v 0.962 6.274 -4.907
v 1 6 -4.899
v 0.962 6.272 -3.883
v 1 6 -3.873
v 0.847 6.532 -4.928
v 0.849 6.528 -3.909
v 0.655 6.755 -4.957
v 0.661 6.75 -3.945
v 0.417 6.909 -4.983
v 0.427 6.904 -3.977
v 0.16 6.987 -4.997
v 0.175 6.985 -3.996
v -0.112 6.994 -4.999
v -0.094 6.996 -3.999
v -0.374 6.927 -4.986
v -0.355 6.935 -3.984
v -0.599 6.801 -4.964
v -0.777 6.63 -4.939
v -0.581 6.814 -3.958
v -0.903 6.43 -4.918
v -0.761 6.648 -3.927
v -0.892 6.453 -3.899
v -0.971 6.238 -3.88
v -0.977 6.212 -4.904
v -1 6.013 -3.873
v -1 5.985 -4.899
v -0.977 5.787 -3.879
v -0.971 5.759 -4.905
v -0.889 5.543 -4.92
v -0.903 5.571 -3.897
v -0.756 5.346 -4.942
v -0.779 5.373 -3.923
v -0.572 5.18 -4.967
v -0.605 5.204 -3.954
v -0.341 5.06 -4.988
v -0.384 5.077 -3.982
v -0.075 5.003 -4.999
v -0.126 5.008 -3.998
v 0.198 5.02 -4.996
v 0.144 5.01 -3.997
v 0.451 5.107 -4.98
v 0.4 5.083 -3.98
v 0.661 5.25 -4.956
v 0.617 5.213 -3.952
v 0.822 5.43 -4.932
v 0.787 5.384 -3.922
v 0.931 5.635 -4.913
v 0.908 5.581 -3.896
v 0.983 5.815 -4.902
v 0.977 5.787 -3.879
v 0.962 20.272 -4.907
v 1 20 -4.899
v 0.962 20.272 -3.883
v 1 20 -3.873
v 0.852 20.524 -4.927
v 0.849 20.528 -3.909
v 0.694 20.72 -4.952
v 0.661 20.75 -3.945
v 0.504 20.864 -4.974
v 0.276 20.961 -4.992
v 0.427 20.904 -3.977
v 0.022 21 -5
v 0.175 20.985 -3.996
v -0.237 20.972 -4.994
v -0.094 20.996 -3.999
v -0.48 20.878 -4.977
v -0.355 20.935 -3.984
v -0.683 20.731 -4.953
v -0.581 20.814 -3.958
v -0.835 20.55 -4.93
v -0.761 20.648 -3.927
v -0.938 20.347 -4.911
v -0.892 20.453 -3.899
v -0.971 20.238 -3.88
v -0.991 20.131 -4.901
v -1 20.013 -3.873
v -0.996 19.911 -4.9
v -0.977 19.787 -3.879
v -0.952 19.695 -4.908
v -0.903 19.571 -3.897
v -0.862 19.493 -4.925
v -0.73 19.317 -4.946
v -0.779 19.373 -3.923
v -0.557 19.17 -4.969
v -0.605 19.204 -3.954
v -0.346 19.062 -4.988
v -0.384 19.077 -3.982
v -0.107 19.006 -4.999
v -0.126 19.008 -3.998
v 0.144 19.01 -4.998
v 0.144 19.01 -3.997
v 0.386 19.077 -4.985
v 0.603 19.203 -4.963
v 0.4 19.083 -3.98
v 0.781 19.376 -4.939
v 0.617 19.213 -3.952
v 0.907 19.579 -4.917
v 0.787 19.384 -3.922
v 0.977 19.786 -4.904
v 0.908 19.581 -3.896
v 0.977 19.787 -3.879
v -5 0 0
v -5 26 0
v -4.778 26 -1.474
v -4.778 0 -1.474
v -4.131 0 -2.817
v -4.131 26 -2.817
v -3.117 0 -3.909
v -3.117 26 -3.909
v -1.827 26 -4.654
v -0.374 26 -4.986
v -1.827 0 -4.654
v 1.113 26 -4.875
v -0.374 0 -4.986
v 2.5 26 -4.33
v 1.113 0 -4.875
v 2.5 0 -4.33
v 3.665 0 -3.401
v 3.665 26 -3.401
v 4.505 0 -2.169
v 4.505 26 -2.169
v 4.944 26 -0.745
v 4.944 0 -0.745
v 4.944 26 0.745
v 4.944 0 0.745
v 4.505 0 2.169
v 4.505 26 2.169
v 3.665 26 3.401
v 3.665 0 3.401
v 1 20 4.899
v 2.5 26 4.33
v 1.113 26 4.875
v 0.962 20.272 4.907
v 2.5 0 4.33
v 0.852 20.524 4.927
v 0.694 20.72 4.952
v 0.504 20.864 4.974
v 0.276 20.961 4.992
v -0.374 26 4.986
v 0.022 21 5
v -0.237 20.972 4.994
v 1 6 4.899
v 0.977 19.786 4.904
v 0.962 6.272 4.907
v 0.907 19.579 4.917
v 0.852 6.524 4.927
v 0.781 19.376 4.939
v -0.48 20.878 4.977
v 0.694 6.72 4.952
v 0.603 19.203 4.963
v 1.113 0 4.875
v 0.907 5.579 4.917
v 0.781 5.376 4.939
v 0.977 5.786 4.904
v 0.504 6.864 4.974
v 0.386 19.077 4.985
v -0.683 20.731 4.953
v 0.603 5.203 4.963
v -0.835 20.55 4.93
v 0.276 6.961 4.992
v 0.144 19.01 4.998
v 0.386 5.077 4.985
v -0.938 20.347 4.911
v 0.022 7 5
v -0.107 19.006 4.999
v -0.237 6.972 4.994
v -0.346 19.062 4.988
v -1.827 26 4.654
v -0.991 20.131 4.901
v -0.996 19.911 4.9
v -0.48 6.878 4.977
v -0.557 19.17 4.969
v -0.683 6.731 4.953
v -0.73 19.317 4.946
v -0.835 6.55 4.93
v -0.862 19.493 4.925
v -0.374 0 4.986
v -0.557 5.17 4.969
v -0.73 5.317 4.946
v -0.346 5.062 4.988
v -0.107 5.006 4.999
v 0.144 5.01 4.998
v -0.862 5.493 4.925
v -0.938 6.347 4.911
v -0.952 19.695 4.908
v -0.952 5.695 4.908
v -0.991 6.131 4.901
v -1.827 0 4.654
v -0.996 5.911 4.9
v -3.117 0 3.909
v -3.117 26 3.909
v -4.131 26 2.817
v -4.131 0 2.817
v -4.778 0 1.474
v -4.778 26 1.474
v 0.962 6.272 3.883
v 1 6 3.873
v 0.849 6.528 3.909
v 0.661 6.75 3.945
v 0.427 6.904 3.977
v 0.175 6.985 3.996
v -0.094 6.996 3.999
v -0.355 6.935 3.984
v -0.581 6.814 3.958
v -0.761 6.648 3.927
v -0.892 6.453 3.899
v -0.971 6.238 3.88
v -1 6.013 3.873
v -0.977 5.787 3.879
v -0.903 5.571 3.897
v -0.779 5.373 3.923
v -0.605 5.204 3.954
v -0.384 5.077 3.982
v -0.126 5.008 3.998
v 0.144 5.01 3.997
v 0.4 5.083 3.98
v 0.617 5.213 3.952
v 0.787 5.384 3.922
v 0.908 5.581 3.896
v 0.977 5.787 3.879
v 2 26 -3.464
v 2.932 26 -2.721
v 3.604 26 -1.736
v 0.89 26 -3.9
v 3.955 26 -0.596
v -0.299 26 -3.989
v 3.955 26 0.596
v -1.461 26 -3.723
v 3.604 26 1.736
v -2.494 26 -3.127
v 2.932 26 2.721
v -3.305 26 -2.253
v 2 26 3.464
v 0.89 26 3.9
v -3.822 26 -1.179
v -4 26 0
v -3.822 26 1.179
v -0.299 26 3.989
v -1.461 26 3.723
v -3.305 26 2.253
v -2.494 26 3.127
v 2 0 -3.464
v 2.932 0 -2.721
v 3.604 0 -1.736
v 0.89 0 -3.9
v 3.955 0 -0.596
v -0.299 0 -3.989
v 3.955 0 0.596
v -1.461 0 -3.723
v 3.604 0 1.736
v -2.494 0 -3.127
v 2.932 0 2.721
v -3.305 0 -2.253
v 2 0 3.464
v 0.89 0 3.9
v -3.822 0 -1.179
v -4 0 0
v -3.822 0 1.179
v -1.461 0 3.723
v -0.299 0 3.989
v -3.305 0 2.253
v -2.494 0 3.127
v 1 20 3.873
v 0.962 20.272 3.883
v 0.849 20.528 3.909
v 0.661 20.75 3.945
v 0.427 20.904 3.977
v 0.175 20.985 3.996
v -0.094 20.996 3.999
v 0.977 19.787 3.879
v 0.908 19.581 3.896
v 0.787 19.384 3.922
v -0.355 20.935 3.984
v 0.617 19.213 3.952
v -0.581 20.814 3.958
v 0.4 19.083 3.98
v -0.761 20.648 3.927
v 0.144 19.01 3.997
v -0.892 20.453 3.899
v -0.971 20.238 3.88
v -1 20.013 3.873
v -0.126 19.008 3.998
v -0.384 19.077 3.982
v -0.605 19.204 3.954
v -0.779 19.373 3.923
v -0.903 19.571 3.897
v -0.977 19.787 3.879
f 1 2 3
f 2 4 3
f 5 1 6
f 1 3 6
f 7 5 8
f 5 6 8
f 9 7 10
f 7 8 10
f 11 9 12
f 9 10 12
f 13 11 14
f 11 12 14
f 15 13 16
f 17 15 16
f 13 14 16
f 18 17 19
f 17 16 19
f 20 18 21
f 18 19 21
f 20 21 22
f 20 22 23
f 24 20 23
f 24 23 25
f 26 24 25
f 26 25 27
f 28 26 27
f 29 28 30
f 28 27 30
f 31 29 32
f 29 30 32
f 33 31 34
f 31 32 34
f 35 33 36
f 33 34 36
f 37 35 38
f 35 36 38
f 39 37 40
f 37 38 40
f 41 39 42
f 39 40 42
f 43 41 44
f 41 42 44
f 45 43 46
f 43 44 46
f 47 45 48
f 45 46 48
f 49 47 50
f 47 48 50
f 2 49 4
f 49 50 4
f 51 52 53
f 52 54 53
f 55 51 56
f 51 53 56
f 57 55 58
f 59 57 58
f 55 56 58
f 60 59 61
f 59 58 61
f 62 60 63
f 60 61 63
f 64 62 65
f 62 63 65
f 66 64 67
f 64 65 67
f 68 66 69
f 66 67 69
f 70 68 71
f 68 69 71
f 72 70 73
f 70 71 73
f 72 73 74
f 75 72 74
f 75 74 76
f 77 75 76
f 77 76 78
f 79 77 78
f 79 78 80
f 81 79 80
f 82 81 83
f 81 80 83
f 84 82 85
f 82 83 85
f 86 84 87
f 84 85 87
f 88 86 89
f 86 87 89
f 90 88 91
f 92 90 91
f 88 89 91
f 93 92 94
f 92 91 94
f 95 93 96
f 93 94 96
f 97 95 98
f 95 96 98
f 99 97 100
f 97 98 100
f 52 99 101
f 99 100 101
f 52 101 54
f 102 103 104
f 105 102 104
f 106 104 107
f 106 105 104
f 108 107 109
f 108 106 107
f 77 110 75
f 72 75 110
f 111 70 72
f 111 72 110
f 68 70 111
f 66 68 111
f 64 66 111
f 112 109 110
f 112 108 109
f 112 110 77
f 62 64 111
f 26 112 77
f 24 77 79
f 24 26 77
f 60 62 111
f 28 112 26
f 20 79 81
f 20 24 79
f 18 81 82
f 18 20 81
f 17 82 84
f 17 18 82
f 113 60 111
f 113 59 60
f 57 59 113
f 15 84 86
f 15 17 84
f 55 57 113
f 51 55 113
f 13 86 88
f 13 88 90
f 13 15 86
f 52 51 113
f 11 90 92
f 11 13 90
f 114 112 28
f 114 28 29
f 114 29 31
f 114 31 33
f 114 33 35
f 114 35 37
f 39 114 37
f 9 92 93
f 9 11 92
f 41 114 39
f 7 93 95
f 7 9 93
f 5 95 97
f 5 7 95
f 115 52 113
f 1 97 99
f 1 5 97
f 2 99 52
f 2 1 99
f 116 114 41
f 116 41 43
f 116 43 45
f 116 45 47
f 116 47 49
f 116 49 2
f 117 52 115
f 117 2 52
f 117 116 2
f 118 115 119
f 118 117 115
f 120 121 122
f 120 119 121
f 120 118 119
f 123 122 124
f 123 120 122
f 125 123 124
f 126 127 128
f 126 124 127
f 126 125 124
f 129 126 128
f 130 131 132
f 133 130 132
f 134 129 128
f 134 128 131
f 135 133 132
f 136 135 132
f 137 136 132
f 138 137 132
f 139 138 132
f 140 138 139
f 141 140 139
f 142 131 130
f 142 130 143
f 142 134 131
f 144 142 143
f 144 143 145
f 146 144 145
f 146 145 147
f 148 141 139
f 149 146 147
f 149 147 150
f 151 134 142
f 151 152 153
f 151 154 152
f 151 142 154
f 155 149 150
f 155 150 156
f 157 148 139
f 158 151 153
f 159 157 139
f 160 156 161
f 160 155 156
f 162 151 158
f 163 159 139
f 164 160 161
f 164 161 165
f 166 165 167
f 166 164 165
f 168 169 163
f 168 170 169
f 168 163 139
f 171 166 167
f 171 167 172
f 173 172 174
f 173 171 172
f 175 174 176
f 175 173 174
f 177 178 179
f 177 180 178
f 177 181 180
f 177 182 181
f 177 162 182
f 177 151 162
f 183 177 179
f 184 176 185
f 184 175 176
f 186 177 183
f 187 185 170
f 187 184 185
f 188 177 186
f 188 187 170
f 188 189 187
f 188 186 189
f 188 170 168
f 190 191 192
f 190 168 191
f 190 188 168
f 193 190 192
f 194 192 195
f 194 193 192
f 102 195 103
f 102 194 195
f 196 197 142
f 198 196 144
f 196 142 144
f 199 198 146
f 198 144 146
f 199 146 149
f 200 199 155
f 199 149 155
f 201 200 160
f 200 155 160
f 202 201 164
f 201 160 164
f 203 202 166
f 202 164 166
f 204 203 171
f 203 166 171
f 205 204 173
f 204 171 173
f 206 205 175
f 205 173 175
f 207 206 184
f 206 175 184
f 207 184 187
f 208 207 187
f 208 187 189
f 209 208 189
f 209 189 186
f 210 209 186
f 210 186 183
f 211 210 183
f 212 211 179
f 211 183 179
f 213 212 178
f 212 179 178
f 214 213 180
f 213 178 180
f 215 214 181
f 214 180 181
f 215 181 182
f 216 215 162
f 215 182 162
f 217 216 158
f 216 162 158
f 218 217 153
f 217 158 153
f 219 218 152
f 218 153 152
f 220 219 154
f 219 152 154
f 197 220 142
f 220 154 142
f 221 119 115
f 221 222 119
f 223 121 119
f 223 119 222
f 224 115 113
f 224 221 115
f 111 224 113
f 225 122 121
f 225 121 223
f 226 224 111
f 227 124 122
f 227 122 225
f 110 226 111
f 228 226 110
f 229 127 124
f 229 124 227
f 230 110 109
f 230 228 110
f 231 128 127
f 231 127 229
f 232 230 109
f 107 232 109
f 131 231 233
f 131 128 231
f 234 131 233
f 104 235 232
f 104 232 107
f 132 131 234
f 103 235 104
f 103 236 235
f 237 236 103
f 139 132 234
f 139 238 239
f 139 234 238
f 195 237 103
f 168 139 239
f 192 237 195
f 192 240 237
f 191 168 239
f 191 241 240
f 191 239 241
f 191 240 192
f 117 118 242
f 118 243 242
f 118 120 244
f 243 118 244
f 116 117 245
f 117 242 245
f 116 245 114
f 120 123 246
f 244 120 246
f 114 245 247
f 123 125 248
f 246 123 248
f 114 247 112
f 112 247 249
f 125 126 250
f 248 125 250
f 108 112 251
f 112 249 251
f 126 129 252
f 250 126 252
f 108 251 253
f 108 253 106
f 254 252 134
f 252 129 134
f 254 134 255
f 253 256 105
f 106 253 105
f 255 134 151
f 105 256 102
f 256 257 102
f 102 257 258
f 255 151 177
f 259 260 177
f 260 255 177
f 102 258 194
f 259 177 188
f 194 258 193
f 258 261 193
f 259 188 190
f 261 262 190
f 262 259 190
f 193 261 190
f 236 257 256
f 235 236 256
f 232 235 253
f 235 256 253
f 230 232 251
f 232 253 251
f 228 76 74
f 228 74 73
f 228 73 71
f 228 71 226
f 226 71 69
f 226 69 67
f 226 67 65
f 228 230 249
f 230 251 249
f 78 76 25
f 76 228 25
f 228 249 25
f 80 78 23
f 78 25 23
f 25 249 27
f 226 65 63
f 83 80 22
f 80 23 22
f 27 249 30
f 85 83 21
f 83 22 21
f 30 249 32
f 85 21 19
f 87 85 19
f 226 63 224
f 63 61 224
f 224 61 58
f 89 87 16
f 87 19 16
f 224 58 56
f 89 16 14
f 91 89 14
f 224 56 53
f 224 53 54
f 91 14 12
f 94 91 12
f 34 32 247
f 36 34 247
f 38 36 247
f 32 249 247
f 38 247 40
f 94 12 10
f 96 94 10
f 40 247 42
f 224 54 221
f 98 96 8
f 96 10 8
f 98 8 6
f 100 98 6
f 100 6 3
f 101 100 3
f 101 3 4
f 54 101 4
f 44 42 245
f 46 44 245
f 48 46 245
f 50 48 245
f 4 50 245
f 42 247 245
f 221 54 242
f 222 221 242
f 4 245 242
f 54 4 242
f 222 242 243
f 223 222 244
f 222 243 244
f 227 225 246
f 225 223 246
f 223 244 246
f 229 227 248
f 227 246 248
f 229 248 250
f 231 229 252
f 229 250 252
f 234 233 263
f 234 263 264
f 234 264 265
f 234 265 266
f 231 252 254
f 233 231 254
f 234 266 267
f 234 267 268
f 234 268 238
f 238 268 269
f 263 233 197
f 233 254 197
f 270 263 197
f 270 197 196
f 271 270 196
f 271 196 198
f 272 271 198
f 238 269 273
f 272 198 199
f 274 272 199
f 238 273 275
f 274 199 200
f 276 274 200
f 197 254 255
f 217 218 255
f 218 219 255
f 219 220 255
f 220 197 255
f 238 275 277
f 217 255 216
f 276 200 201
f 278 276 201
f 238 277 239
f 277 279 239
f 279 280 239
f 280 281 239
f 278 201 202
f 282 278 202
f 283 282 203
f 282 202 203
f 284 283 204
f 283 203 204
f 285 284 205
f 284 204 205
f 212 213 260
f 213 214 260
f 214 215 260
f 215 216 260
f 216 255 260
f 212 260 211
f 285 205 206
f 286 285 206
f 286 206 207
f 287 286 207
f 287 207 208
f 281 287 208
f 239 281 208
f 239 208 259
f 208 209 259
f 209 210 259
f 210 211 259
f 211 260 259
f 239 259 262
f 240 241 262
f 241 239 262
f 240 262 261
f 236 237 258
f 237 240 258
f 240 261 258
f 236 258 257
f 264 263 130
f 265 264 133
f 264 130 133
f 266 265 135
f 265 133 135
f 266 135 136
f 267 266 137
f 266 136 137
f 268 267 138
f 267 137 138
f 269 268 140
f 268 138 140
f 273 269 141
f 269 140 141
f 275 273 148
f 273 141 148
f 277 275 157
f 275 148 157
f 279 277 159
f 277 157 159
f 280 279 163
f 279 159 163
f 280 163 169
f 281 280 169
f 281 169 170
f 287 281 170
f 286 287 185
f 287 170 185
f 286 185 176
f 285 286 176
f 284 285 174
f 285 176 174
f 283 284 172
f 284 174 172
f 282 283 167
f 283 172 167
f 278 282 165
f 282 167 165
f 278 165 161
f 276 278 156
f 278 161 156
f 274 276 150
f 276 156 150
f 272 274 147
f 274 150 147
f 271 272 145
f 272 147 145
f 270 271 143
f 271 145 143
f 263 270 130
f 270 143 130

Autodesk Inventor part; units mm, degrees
ref_plane "YZ Plane" through (0, 0, 0) normal (1, 0, 0) x (0, 1, 0)
ref_plane "XZ Plane" through (0, 0, 0) normal (0, 1, 0) x (-1, 0, 0)
ref_plane "XY Plane" through (0, 0, 0) normal (0, 0, 1) x (1, 0, 0)
sketch "Sketch9" plane through (0, 0, 0) normal (0, 1, 0) x (-1, 0, 0)
  circle A0 centre (0, 0) radius 4
  circle A1 centre (0, 0) radius 5
  dimension "d140" = 8
  dimension "d149" = 10
extrude "Extrusion10" add sketch "Sketch9" along normal blind 26
sketch "Sketch10" plane through (0, 0, 0) normal (0, 0, 1) x (1, 0, 0)
  line L0 (0, 0) -> (0, 6)
  circle A0 centre (0, 6) radius 1
  line L1 (-4, 26) -> (4, 26) projected
  line L2 (0, 26) -> (0, 20)
  circle A1 centre (0, 20) radius 1
  dimension "d143" = 6
  dimension "d144" = 2
  dimension "d145" = 6
  dimension "d146" = 2
extrude "Extrusion11" cut sketch "Sketch10" along normal mid plane 24
properties part number "airfoil"
